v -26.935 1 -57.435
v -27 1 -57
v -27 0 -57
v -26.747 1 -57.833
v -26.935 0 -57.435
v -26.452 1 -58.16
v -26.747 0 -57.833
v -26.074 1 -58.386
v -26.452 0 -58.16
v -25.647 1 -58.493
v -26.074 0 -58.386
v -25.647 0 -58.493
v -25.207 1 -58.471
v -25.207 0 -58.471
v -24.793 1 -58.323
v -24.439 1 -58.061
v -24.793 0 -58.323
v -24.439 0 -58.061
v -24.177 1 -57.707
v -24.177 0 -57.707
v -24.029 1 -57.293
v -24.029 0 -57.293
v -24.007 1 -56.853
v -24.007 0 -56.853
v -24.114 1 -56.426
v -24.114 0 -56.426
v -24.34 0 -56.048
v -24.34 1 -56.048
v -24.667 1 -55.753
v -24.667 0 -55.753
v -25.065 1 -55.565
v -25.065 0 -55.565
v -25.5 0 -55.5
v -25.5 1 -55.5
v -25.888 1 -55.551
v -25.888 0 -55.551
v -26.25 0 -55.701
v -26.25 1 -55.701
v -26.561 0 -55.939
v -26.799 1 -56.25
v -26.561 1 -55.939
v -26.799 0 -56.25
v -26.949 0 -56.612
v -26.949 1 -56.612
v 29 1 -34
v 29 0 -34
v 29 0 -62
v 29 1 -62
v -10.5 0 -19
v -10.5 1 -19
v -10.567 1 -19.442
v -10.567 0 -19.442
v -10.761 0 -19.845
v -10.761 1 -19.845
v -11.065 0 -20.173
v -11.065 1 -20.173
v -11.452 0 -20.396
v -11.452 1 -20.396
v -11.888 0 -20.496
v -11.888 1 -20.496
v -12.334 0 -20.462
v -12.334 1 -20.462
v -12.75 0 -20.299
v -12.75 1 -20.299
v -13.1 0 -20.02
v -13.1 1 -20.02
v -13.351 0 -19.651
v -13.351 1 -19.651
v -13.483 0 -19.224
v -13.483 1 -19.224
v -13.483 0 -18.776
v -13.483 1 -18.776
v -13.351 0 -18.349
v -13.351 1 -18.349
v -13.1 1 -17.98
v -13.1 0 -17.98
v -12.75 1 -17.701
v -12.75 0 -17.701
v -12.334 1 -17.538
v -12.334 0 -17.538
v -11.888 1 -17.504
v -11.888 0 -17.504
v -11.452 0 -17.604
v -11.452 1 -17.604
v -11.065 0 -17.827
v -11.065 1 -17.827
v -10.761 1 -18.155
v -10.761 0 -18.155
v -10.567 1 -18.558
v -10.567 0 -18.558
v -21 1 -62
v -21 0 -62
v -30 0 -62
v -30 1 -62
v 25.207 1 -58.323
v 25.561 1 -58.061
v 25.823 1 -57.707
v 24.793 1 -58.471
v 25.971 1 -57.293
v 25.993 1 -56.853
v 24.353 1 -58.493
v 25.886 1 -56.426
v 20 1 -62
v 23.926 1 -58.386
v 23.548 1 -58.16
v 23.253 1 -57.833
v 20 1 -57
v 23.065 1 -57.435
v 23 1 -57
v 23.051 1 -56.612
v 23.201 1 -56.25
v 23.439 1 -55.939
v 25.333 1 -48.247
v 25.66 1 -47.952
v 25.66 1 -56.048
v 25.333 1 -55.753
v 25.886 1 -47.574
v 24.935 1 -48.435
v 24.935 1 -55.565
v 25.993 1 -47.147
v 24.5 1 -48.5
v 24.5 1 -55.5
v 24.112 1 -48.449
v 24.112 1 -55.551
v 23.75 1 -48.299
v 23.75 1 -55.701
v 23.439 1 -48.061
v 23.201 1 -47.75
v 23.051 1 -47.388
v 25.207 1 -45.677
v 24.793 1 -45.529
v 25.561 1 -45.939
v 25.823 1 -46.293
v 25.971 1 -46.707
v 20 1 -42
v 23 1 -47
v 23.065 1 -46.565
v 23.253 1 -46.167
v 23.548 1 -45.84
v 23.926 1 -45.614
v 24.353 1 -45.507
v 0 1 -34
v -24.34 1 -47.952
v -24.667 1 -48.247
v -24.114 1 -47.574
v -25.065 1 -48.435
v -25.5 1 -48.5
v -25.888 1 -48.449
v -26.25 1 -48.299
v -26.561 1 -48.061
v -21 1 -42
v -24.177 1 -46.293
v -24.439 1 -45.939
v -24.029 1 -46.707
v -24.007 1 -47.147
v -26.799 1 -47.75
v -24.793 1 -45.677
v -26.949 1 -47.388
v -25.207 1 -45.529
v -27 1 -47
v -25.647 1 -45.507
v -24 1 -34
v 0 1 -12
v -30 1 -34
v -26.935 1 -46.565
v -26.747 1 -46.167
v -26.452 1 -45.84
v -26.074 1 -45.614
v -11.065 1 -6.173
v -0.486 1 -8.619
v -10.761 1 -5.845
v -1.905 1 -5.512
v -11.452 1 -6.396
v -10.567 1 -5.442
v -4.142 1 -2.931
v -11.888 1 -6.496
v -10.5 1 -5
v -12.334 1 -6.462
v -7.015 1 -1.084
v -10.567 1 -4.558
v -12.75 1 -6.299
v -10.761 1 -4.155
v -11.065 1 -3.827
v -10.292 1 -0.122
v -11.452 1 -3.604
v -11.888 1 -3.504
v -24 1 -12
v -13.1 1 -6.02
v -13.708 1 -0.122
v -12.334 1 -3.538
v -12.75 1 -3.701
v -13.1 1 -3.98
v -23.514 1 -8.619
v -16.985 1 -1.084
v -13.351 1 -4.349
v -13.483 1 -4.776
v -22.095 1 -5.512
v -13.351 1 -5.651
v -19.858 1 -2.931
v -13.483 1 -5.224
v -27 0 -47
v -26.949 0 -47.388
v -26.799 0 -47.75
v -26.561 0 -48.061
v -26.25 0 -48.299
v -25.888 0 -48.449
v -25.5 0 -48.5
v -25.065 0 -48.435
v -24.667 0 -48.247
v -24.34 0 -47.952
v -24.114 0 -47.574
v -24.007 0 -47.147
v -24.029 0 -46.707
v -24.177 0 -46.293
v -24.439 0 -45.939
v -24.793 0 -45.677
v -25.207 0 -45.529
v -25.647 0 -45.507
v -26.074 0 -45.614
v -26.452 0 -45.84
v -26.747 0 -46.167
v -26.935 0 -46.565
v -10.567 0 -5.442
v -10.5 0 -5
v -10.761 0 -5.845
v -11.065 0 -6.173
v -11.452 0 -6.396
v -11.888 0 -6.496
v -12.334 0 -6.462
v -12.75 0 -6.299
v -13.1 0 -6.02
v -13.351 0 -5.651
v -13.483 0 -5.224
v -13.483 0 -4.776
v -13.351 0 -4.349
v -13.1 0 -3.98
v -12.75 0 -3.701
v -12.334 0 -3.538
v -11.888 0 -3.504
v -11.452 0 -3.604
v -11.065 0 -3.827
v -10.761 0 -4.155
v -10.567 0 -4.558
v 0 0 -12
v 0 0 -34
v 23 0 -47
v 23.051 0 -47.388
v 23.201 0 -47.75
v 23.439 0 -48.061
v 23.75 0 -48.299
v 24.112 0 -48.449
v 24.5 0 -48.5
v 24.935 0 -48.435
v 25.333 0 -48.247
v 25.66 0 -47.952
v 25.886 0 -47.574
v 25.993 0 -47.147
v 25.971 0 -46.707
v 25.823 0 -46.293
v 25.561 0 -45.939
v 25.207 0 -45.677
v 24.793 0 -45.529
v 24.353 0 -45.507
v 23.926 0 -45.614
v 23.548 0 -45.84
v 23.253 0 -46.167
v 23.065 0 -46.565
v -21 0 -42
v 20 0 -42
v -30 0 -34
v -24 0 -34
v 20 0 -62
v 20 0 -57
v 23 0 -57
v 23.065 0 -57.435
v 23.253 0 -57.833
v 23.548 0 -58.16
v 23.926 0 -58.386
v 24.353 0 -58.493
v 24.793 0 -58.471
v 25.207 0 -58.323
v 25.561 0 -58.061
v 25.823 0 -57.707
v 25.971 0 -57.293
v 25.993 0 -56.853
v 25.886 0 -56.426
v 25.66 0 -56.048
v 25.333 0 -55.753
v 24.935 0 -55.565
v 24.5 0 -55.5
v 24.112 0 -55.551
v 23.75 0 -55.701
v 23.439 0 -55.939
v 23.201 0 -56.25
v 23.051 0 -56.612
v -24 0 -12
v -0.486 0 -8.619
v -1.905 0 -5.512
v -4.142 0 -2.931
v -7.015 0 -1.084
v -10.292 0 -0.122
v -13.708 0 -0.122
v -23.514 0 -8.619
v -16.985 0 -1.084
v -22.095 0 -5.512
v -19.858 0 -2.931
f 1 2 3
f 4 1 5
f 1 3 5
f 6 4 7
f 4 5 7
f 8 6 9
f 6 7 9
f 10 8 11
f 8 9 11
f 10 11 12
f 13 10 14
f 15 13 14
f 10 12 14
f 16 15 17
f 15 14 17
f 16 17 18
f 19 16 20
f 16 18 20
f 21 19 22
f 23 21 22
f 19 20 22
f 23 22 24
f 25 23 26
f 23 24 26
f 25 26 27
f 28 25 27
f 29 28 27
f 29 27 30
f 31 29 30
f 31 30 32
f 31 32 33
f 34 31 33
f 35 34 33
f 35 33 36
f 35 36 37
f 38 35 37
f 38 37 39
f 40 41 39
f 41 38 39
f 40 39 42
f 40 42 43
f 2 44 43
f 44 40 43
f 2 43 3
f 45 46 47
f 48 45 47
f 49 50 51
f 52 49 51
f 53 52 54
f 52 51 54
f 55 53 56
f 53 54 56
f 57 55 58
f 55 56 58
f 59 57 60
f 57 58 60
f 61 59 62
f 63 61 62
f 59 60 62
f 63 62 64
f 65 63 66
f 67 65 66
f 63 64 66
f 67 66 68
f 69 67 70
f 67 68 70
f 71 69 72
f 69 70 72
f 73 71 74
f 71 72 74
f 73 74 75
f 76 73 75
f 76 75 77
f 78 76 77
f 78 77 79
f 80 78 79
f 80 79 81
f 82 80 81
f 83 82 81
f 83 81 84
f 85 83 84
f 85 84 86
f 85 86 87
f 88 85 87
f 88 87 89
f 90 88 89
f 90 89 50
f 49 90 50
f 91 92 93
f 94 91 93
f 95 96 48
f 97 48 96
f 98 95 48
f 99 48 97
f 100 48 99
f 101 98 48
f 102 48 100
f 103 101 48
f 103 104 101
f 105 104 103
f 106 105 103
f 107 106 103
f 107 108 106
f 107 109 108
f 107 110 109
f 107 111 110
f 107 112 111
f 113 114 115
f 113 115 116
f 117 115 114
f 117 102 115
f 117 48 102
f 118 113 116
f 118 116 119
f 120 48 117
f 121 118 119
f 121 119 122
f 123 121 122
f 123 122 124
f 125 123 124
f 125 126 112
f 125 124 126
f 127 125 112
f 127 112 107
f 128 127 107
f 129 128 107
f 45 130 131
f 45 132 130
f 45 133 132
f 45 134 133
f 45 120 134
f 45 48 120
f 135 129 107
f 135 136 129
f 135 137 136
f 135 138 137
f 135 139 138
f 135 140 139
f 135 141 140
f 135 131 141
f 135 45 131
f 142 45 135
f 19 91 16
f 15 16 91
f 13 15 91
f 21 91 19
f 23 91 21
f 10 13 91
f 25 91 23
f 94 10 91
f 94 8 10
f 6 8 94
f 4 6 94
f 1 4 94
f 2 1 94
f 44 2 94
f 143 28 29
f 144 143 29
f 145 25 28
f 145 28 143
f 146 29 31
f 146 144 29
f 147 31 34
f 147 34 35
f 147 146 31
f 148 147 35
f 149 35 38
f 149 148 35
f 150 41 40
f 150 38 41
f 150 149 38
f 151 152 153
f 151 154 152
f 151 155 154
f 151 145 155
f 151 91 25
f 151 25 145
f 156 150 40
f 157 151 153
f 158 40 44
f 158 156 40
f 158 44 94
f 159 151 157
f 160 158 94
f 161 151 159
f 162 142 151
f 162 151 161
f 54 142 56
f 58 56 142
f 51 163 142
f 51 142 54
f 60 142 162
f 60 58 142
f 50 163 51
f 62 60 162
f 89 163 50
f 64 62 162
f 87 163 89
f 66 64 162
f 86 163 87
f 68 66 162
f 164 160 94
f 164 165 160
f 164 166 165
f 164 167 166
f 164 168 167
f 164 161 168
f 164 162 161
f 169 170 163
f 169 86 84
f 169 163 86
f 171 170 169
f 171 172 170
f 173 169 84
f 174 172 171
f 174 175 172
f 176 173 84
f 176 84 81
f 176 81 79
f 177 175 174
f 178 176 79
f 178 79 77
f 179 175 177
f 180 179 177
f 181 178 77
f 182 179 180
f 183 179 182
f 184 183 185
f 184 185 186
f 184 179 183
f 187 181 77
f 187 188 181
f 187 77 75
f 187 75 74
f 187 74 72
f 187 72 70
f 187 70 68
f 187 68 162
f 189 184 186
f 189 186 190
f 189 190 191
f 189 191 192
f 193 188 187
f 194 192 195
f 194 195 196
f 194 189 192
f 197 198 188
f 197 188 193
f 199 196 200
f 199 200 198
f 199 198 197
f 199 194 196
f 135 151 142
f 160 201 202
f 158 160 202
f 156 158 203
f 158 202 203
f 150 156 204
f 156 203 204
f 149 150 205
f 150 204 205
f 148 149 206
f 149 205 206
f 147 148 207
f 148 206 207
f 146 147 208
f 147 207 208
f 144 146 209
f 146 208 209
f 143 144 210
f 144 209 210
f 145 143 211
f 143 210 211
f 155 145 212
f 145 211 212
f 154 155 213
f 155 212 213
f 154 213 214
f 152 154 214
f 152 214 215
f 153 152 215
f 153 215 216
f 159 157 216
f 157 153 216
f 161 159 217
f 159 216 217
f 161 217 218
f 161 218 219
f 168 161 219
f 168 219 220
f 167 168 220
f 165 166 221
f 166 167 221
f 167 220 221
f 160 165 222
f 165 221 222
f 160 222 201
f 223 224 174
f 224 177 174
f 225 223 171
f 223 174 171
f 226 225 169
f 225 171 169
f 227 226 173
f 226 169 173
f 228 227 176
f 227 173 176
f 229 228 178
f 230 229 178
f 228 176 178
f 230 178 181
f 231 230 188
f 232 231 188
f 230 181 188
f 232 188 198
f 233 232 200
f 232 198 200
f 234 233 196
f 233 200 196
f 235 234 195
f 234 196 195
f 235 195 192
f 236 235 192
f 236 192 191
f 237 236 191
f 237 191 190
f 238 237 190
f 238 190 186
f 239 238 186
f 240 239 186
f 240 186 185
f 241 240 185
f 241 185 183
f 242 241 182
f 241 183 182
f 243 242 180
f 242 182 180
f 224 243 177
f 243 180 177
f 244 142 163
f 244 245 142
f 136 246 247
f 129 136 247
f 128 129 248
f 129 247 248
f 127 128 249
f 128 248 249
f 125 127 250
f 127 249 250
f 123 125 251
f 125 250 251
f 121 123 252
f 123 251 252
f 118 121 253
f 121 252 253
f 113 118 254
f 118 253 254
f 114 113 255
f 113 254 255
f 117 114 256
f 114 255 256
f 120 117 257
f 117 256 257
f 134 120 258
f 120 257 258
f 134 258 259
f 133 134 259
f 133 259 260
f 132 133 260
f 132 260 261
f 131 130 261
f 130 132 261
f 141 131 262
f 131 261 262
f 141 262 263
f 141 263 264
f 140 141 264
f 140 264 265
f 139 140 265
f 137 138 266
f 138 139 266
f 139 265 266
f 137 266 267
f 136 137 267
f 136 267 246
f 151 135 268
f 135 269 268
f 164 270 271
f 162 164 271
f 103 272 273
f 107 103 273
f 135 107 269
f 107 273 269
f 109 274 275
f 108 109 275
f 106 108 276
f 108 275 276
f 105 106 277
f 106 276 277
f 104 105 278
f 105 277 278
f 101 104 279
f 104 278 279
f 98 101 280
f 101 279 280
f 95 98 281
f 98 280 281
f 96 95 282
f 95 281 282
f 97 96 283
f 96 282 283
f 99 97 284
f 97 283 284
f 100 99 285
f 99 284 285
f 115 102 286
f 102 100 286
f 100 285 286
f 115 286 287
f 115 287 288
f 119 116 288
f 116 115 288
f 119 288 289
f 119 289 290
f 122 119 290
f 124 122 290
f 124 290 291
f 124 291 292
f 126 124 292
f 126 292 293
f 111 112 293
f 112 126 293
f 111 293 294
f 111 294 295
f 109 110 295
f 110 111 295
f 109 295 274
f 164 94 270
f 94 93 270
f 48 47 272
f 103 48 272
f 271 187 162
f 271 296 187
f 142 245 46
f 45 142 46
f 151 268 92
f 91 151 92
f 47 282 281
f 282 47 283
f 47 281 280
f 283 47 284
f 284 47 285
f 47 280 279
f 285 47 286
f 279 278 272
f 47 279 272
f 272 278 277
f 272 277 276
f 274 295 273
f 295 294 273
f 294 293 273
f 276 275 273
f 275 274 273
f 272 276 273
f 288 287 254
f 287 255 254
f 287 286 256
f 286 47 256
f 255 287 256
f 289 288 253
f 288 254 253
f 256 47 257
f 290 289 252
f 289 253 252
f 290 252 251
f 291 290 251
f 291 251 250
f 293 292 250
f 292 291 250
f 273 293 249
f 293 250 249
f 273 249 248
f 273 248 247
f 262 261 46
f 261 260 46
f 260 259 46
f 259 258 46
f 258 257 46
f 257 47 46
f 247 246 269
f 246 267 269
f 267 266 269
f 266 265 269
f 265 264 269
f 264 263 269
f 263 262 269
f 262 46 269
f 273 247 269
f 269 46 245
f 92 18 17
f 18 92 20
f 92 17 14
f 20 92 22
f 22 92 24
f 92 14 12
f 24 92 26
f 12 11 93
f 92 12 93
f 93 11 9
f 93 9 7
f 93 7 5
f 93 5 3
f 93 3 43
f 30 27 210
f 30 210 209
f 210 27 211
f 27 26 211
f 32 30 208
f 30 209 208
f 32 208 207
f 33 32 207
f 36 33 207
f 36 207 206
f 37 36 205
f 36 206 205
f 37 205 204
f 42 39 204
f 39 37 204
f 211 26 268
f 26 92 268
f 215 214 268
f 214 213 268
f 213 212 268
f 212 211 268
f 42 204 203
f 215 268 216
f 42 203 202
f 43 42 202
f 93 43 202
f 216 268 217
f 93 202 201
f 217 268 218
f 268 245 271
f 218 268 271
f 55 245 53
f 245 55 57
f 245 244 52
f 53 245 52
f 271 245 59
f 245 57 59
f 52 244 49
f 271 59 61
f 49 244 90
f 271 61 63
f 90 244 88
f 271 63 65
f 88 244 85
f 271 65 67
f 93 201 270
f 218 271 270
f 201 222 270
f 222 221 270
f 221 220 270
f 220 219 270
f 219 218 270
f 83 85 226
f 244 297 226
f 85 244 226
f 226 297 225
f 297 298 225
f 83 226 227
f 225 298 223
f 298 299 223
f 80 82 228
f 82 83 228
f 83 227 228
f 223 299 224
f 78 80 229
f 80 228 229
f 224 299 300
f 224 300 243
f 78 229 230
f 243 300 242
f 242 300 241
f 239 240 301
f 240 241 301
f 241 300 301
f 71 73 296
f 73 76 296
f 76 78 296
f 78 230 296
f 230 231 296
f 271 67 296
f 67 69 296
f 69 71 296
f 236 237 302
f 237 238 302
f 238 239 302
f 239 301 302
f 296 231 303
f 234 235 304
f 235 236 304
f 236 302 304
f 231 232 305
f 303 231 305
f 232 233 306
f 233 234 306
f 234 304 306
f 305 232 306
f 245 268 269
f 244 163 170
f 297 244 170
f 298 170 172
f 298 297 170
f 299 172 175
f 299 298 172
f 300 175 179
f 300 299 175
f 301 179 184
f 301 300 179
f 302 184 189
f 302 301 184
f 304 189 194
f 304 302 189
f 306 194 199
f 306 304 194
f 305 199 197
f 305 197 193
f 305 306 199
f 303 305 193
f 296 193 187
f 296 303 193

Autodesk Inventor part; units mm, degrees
ref_plane "YZ Plane" through (0, 0, 0) normal (1, 0, 0) x (0, 1, 0)
ref_plane "XZ Plane" through (0, 0, 0) normal (0, 1, 0) x (-1, 0, 0)
ref_plane "XY Plane" through (0, 0, 0) normal (0, 0, 1) x (1, 0, 0)
sketch "Sketch1" plane through (0, 0, 0) normal (0, 1, 0) x (-1, 0, 0)
  line L0 (12, 0) -> (12, 0)
  line L1 (24, -12) -> (24, -34)
  line L2 (0, -34) -> (0, -12)
  arc A0 (24, -12) -> (12, 0) centre (12, -12) ccw
  arc A1 (12, 0) -> (0, -12) centre (12, -12) ccw
  line L3 (0, -34) -> (-29, -34)
  line L4 (-29, -34) -> (-29, -62)
  line L5 (-29, -62) -> (-20, -62)
  line L6 (-20, -62) -> (-20, -42)
  line L7 (-20, -42) -> (21, -42)
  line L8 (21, -42) -> (21, -62)
  line L9 (21, -62) -> (30, -62)
  line L10 (30, -62) -> (30, -34)
  line L11 (30, -34) -> (24, -34)
  line L12 (25.5, -62) -> (25.5, -57)
  line L13 (25.5, -57) -> (25.5, -47)
  circle A2 centre (25.5, -57) radius 1.5
  circle A3 centre (25.5, -47) radius 1.5
  line L14 (25.5, -57) -> (-24.5, -57)
  line L15 (-24.5, -57) -> (-24.5, -47)
  circle A4 centre (-24.5, -47) radius 1.5
  circle A5 centre (-24.5, -57) radius 1.5
  point P0 (0, 0)
  point P1 (24, 0)
  dimension "d0" = 24
  dimension "d1" = 34
  dimension "d2" = 12
  dimension "d3" = 29
  dimension "d4" = 28
  dimension "d5" = 9
  dimension "d6" = 20
  dimension "d7" = 41
  dimension "d8" = 9
  dimension "d9" = 5
  dimension "d10" = 10
  dimension "d11" = 3
  dimension "d12" = 3
  dimension "d13" = 3
  dimension "d14" = 3
extrude "Extrusion1" add sketch "Sketch1" along normal blind 1 contours L1 L11 L10 L9 L12 A2 L14 L8 L7 L6 L5 L4 L3 L2 A1 A0 | L9 L8 L14 A2 L12
sketch "Sketch2" plane through (0, 1, 0) normal (0, 1, 0) x (1, 0, 0)
  arc A0 (-24, 12) -> (0, 12) centre (-12, 12) ccw projected
  circle A1 centre (-25.5, 57) radius 1.5 projected
  circle A2 centre (-25.5, 47) radius 1.5 projected
  line L0 (-25.5, 57) -> (-25.5, 47)
  line L1 (-12, 12) -> (-12, 19)
  line L2 (-12, 19) -> (-12, 5)
  circle A3 centre (-12, 5) radius 1.5
  circle A4 centre (-12, 19) radius 1.5
  point P0 (0, 0)
  dimension "d17" = 7
  dimension "d18" = 14
  dimension "d19" = 3
  dimension "d20" = 3
extrude "Extrusion2" cut sketch "Sketch2" against normal blind 1 contours A4 | A3
properties part number "Wrist Servo Plate"
